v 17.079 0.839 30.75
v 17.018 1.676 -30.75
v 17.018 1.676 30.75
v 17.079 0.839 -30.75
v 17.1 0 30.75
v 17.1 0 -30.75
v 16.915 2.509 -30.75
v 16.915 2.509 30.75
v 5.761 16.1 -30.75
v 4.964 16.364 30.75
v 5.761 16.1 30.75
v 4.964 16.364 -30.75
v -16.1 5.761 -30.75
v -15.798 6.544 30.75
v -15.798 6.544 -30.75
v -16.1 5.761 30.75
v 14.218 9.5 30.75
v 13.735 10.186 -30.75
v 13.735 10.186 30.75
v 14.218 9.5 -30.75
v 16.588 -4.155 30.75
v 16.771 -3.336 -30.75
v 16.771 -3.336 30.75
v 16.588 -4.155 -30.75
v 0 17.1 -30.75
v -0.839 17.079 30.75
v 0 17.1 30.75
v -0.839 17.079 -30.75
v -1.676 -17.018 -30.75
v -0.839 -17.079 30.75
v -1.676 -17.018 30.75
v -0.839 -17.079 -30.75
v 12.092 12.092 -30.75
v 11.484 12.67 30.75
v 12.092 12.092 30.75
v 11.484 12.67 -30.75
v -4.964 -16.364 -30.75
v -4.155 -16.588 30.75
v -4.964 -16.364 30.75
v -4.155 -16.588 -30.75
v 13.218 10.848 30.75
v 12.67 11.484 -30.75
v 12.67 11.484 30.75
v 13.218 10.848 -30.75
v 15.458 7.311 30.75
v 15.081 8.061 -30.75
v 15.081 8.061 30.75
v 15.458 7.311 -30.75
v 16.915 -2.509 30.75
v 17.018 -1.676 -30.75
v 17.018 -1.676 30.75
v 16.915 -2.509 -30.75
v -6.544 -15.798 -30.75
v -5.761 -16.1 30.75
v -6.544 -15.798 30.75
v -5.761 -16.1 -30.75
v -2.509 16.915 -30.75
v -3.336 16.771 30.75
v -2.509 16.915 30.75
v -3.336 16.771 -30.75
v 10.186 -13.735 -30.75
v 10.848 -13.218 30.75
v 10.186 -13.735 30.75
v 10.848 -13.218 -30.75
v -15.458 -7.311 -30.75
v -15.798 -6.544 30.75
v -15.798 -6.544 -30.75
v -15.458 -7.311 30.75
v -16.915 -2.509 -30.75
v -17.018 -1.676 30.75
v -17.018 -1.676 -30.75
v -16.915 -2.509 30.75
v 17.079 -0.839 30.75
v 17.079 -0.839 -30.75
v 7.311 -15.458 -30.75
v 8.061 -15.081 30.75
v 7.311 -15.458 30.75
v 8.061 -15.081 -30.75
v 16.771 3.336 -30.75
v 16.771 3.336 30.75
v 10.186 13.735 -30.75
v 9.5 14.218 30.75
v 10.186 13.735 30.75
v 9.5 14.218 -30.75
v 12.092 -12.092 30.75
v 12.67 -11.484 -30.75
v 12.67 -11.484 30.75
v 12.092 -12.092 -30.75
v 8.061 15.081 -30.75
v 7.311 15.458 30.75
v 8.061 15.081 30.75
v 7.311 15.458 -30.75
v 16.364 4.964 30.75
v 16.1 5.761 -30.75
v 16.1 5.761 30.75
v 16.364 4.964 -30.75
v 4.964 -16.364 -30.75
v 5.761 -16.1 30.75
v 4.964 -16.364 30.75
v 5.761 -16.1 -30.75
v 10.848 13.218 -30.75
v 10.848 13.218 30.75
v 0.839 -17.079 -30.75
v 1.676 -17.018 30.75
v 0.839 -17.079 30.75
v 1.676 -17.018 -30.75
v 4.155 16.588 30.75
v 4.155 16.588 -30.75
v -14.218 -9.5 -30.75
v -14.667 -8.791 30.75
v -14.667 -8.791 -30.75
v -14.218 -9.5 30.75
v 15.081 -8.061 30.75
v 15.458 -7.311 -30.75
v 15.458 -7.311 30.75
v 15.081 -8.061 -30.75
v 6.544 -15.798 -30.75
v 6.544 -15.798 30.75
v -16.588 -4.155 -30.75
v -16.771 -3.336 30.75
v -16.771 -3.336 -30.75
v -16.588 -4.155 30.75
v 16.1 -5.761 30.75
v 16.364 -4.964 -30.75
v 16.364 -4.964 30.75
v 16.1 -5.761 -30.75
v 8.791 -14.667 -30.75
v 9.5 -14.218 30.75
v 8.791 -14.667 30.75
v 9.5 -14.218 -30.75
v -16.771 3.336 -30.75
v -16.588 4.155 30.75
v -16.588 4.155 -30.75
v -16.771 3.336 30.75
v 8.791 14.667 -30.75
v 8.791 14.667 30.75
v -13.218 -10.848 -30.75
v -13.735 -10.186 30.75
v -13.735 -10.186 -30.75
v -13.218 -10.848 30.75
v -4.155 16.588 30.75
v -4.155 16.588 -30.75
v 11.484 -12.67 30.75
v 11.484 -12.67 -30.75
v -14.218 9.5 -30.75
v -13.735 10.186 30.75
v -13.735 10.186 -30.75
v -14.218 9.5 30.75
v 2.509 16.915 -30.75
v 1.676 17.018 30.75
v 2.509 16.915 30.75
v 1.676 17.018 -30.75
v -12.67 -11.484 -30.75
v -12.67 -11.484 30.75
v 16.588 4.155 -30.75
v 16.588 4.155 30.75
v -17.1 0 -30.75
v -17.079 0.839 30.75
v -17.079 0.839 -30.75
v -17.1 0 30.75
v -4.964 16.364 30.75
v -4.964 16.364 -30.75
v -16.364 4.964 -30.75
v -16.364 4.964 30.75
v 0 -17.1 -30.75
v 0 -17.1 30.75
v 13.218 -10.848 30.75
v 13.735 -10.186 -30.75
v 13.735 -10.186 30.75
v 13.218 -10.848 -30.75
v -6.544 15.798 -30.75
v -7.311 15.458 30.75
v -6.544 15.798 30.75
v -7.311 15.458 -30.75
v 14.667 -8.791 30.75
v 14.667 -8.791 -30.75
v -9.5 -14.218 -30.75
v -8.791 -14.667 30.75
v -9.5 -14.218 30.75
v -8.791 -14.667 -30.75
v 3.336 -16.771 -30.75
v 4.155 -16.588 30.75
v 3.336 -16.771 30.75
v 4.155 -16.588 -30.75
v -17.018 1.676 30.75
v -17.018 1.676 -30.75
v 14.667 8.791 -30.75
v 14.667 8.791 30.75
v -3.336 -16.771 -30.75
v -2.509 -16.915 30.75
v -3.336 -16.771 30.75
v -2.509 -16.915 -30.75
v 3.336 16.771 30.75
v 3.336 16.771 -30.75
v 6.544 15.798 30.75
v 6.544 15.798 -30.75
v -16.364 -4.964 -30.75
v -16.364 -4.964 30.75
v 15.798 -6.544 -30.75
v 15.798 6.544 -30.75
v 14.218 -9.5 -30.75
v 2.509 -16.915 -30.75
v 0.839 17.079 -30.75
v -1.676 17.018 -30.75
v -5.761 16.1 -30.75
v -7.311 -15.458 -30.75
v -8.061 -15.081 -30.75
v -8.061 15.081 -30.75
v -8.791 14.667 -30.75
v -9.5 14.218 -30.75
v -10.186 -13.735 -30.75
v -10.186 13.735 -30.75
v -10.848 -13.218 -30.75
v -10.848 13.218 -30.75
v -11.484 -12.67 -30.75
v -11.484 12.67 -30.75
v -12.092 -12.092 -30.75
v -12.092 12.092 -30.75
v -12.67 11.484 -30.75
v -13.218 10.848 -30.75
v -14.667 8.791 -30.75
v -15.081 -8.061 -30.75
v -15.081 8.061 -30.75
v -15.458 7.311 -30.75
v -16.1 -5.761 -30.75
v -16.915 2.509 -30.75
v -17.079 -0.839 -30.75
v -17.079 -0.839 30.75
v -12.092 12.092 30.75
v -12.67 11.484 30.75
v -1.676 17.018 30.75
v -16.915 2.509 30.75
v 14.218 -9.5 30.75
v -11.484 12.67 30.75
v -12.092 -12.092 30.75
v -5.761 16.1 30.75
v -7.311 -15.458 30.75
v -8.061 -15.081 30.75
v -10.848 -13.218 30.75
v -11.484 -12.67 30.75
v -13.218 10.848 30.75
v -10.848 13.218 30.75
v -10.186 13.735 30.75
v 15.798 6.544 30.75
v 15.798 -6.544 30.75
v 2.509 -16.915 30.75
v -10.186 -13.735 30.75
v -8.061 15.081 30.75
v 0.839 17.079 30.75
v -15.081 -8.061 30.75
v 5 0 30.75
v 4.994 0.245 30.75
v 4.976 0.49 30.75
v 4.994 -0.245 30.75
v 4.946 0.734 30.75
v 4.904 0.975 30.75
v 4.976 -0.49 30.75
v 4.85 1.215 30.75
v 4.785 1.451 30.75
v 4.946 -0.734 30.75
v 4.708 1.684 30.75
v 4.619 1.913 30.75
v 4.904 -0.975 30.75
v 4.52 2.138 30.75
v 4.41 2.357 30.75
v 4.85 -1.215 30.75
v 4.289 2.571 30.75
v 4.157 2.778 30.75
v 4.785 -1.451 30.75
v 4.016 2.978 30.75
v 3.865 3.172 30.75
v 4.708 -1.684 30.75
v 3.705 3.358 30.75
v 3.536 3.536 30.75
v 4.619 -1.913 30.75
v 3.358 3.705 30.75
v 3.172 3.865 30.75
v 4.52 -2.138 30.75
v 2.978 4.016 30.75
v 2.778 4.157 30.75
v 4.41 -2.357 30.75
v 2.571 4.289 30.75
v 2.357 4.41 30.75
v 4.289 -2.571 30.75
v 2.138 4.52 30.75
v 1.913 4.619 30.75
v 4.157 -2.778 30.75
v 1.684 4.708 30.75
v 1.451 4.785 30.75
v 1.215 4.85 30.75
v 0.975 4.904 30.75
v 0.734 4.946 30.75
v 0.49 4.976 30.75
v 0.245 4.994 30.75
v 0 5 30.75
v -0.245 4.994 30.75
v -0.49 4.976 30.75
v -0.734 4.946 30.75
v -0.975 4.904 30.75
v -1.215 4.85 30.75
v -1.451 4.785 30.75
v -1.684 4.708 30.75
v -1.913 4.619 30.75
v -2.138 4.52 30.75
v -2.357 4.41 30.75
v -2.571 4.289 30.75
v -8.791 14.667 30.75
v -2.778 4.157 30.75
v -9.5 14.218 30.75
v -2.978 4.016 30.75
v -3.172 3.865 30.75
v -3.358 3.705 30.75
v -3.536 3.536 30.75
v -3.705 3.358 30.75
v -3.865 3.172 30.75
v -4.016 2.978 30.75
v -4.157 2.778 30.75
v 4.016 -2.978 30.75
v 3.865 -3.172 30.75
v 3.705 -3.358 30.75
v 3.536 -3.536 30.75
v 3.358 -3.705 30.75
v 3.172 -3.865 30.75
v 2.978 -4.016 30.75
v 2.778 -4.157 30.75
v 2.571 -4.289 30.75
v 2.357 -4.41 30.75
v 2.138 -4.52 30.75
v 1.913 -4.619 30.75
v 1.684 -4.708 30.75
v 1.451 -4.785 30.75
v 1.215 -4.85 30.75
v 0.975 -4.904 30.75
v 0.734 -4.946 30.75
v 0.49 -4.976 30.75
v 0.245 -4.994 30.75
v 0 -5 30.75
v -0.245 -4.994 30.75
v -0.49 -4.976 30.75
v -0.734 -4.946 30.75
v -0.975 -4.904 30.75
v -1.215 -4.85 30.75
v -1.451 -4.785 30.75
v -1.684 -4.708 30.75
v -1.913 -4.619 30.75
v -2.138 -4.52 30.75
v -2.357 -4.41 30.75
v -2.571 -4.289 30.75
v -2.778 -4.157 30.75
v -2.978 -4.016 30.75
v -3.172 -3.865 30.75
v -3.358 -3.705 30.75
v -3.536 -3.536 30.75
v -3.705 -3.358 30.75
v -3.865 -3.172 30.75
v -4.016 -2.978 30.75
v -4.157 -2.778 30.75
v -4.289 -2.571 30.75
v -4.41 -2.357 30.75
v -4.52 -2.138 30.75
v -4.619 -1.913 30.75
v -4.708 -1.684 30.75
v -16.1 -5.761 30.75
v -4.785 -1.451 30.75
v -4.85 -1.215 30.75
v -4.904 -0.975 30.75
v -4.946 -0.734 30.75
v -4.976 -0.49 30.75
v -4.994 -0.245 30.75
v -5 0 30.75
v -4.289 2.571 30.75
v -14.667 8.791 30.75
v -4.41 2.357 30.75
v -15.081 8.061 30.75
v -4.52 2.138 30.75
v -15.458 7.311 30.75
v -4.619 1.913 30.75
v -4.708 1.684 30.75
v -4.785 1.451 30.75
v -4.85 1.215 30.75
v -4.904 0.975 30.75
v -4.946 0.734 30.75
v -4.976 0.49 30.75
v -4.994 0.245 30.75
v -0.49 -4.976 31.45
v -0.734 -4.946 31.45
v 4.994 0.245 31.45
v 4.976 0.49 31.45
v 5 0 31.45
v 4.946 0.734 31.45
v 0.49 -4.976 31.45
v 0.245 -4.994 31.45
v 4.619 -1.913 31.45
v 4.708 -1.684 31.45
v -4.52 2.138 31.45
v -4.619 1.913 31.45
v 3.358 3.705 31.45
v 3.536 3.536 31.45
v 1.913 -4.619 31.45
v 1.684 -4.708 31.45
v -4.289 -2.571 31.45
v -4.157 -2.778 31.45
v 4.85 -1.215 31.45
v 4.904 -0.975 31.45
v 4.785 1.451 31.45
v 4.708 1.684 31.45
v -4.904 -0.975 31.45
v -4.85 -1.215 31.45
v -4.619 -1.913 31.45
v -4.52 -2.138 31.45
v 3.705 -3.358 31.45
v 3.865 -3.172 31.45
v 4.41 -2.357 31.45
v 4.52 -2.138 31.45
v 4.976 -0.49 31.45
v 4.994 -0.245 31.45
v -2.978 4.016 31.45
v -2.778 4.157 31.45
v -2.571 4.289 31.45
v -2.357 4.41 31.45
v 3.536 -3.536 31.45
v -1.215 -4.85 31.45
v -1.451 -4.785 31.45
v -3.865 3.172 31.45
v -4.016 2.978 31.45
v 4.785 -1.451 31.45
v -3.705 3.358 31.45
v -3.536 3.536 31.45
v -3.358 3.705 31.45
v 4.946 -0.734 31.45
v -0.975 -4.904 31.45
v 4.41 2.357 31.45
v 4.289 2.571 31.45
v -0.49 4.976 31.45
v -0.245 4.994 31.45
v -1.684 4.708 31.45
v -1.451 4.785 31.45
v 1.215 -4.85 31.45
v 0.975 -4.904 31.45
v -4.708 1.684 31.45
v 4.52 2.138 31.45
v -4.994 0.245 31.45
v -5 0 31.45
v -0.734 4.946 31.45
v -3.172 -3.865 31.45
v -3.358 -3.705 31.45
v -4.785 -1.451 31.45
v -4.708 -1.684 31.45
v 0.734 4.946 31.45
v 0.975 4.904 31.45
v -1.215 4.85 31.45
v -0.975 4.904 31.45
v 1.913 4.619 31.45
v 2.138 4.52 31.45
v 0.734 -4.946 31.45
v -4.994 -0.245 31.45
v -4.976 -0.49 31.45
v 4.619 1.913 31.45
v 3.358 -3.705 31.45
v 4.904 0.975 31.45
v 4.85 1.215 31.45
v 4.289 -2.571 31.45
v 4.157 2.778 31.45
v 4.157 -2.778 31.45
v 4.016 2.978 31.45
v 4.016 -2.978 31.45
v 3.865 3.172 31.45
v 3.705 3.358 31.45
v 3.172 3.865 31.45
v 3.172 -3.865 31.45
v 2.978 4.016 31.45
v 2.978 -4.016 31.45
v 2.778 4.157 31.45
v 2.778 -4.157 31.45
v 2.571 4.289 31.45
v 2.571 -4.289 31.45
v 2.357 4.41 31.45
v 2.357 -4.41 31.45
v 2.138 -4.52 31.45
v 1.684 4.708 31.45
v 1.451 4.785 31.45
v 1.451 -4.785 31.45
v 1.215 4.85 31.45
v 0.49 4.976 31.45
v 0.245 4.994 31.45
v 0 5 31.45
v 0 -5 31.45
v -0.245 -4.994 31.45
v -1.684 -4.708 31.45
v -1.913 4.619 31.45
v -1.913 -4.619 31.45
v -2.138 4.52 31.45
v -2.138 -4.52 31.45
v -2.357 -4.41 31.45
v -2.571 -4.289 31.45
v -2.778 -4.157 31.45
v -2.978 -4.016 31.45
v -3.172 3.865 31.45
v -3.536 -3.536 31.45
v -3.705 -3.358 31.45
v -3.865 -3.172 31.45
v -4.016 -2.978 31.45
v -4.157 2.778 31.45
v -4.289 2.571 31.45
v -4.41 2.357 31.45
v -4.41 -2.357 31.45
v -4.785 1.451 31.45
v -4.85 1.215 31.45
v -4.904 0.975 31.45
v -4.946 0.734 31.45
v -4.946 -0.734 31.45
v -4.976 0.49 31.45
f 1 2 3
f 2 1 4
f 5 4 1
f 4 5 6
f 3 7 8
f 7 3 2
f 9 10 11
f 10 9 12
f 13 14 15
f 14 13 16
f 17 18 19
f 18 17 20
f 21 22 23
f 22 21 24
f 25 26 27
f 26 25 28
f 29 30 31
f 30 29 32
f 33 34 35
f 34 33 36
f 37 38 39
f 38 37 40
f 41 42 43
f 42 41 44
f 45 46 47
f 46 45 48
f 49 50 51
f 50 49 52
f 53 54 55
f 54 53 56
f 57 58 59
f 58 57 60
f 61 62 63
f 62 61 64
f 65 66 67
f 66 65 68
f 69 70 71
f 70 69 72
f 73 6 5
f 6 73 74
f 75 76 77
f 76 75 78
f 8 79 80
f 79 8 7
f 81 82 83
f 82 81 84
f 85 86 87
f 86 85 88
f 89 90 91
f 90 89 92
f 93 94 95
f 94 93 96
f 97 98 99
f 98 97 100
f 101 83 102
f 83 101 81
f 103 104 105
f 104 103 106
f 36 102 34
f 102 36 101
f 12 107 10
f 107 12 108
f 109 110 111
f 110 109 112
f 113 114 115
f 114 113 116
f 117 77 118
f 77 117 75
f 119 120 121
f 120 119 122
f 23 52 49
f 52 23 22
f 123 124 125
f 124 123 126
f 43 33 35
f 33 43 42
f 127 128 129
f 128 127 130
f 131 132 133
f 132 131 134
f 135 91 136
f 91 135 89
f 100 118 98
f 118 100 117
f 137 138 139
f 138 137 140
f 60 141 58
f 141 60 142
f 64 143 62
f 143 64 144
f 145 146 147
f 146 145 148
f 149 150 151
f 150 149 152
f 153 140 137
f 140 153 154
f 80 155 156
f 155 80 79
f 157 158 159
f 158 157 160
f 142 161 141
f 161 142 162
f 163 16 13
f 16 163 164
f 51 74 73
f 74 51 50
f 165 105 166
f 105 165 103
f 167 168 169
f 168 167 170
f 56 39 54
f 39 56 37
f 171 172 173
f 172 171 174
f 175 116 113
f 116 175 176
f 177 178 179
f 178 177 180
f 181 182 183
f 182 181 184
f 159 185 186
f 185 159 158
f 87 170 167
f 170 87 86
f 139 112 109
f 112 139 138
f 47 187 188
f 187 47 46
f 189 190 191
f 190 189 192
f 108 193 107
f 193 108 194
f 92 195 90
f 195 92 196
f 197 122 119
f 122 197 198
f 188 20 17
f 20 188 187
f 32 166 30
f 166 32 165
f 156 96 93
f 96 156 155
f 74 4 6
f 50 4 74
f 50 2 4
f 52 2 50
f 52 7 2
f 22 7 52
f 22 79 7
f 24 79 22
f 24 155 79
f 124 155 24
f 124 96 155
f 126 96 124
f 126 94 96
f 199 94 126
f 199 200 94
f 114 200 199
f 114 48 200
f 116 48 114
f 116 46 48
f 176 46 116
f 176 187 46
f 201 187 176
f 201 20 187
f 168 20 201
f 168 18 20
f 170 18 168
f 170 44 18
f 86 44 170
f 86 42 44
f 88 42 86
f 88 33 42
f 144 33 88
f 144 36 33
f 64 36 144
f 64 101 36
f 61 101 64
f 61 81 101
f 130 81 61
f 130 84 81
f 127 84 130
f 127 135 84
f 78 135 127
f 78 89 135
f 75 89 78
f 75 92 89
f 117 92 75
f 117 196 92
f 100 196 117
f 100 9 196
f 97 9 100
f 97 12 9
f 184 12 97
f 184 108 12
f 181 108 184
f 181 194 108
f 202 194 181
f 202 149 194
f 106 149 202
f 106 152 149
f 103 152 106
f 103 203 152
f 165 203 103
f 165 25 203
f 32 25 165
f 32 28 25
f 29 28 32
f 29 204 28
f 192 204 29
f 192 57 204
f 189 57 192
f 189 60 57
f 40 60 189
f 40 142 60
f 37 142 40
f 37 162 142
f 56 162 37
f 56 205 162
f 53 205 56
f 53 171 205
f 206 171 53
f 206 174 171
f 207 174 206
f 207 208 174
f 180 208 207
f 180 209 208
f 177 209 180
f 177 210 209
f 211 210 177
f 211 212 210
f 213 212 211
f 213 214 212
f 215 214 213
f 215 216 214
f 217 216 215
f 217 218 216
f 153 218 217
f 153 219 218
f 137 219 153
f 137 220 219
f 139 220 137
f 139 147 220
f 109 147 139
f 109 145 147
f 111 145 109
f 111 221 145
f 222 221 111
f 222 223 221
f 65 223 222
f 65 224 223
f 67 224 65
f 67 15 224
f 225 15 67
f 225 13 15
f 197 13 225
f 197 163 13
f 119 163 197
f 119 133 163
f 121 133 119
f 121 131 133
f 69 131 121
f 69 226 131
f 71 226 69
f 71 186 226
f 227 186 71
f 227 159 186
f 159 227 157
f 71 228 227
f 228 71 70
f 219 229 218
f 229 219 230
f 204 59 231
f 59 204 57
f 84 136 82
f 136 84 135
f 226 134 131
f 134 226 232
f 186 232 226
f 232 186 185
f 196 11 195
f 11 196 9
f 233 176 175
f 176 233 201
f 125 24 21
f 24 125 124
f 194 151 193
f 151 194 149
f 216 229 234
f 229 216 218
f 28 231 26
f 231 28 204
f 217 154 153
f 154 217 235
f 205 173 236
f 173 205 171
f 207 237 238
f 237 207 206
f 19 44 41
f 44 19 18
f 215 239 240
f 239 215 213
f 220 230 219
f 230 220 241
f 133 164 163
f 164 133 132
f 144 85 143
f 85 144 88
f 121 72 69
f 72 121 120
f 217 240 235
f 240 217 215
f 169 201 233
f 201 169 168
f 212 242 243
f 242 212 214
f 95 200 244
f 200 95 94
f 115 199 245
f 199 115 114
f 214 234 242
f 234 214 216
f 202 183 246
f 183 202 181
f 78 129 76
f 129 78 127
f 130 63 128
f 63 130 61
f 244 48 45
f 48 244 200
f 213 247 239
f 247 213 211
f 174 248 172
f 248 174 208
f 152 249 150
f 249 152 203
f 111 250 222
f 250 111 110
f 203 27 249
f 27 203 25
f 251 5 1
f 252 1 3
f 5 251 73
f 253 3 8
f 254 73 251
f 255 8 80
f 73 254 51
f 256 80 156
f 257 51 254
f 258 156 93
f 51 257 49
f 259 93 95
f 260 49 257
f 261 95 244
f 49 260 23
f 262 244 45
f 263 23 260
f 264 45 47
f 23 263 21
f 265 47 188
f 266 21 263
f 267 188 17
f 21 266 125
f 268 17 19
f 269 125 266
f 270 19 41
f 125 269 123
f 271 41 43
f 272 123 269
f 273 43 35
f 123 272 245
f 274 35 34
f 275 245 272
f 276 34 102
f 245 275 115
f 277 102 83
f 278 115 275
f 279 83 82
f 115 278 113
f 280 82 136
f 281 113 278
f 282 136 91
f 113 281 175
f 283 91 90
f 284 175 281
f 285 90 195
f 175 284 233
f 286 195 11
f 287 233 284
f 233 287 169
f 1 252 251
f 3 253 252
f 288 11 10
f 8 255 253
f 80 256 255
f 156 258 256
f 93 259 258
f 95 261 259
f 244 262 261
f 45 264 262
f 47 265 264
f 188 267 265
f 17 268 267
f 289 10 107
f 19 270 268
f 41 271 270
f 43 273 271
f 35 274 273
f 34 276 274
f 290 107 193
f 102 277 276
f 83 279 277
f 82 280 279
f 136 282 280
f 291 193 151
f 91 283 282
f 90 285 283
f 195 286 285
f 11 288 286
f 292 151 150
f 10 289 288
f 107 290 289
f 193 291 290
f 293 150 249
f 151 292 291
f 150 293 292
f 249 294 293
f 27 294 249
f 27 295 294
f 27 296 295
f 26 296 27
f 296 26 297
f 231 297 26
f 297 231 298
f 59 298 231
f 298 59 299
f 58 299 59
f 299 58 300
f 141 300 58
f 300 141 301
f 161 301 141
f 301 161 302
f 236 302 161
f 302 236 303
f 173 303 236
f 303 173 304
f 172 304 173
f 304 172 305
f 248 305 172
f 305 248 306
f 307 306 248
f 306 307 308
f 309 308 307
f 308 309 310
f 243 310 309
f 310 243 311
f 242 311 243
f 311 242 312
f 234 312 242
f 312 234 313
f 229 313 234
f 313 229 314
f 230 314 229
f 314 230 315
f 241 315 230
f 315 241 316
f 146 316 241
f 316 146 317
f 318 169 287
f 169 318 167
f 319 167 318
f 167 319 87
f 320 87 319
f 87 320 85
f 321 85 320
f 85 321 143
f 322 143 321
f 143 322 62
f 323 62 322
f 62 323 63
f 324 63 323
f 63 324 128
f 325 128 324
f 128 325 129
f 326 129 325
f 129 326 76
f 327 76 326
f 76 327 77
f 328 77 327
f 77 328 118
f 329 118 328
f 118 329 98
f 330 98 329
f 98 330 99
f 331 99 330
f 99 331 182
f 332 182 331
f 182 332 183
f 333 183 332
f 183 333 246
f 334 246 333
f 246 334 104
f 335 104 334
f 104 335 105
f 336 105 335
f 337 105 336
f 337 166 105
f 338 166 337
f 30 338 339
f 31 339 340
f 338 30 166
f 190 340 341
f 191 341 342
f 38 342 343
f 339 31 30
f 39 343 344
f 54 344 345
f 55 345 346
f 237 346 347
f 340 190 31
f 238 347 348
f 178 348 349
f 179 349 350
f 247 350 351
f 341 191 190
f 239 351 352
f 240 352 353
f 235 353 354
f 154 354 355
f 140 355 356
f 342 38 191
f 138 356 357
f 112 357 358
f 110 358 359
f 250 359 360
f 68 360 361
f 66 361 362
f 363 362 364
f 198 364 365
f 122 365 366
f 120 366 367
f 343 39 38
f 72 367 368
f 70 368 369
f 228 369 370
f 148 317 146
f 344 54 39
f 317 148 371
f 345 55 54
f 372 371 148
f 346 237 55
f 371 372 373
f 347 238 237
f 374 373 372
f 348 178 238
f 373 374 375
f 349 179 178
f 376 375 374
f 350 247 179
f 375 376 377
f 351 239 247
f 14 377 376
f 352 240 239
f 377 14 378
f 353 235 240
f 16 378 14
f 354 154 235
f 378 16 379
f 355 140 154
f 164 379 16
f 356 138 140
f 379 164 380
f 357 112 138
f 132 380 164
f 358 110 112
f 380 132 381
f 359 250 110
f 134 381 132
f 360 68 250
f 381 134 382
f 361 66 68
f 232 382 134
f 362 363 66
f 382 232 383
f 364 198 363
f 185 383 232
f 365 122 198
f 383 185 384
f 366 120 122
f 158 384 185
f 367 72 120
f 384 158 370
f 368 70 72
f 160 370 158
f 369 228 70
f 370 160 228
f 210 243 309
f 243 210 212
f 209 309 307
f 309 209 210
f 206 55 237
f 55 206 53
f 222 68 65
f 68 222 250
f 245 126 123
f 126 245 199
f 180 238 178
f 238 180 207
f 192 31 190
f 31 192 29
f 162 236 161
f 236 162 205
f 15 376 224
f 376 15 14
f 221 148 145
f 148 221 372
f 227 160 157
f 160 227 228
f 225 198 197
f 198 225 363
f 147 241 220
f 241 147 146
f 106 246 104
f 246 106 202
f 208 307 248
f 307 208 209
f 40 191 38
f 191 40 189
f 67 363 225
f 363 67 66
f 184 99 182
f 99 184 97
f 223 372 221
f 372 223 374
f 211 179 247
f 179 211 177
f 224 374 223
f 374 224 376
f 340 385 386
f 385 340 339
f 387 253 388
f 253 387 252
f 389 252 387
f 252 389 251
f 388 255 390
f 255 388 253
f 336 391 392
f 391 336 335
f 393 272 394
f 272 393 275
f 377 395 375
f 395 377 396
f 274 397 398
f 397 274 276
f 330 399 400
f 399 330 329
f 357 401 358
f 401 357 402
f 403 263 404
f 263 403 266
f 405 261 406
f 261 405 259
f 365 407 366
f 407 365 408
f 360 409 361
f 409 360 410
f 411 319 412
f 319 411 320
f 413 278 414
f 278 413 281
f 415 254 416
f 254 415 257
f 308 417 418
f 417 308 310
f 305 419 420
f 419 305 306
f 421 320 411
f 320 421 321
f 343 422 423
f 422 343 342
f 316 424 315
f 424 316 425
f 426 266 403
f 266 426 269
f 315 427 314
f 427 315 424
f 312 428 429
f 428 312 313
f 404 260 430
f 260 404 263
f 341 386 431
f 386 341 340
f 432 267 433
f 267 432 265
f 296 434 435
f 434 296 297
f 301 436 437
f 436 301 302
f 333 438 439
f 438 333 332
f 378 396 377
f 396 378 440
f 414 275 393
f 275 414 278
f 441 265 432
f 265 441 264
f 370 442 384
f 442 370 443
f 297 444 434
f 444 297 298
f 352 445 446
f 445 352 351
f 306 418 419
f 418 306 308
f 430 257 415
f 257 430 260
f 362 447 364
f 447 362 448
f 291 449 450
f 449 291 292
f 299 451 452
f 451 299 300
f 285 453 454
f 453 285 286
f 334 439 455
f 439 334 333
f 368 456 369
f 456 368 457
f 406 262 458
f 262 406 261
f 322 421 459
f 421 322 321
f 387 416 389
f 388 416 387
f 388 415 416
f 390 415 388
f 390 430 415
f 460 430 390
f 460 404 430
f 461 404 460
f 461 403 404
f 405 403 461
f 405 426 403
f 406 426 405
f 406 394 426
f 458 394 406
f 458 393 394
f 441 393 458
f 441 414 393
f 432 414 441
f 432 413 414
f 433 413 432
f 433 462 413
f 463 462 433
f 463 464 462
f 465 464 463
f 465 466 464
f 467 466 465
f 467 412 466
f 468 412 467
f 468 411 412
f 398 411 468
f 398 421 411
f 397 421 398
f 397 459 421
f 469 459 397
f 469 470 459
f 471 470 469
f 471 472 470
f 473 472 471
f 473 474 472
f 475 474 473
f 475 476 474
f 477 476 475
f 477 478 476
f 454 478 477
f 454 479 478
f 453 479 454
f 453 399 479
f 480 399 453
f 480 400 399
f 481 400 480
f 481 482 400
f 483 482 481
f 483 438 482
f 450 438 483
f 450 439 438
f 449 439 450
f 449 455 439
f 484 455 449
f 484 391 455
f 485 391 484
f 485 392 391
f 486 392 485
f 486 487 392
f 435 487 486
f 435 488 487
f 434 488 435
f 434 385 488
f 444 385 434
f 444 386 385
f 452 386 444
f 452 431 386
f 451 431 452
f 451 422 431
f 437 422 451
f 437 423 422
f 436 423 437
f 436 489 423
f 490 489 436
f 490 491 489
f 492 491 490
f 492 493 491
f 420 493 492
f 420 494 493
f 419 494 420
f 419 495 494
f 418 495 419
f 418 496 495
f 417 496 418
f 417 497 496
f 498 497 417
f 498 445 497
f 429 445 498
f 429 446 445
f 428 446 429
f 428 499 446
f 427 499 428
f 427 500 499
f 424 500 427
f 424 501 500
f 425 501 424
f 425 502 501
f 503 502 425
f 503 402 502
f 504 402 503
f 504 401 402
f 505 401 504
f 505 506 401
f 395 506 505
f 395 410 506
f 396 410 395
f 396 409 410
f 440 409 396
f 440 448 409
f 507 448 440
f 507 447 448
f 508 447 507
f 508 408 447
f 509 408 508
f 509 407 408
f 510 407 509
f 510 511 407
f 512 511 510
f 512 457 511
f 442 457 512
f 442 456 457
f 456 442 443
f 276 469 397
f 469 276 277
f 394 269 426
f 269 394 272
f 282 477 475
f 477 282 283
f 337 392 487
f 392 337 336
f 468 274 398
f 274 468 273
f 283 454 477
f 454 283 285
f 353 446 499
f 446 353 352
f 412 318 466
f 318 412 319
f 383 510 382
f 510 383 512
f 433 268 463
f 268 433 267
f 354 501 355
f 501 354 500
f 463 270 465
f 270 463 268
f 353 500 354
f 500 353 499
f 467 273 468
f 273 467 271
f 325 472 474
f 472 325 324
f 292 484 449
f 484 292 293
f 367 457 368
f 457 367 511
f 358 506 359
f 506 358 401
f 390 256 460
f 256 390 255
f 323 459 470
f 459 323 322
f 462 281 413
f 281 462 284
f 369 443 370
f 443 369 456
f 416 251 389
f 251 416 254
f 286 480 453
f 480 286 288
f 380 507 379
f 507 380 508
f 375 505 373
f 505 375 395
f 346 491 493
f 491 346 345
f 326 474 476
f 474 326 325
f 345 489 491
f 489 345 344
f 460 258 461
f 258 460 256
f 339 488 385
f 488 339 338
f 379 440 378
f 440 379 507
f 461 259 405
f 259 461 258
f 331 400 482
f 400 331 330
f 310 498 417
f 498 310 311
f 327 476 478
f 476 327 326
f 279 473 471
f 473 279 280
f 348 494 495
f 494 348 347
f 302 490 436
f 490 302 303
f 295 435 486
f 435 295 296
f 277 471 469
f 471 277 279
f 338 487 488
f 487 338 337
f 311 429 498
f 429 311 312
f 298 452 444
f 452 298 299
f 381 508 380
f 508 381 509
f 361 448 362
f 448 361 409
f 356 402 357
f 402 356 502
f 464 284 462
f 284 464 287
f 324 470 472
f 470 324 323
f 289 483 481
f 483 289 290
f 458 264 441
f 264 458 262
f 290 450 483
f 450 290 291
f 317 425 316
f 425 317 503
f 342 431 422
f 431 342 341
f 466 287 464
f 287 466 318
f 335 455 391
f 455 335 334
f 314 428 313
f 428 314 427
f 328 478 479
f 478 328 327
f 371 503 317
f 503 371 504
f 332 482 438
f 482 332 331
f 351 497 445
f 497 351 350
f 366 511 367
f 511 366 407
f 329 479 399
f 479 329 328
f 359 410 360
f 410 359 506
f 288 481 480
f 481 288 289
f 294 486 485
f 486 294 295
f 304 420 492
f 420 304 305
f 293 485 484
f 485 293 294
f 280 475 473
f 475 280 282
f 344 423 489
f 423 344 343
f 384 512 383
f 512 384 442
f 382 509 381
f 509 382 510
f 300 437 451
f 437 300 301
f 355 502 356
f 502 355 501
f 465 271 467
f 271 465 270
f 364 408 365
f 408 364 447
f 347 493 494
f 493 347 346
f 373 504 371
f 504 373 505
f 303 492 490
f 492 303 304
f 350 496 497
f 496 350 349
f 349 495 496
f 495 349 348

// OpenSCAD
// Battery cell: 61.5mm tall, 34.2mm diameter
$fn = 128;

// Parameters
body_height_mm = 61.5;
body_diameter_mm = 34.2;

positive_terminal_diameter_mm = 10;
positive_terminal_height_mm   = 1.5;

negative_terminal_diameter_mm = 12;
negative_terminal_height_mm   = 0.5;

connect_overlap_mm = 0.8;

// Body
module battery_cell_body() {
    cylinder(r=body_diameter_mm/2, h=body_height_mm, center=true);
}

// Positive terminal (top), connected with overlap
module positive_terminal_cap() {
    translate([0, 0, body_height_mm/2 + positive_terminal_height_mm/2 - connect_overlap_mm])
        cylinder(r=positive_terminal_diameter_mm/2, h=positive_terminal_height_mm, center=true);
}

// Negative terminal (bottom), connected with overlap
module negative_terminal_contact() {
    translate([0, 0, -body_height_mm/2 - negative_terminal_height_mm/2 + connect_overlap_mm])
        cylinder(r=negative_terminal_diameter_mm/2, h=negative_terminal_height_mm, center=true);
}

// Complete battery (one connected solid)
union() {
    battery_cell_body();
    positive_terminal_cap();
    negative_terminal_contact();
}
